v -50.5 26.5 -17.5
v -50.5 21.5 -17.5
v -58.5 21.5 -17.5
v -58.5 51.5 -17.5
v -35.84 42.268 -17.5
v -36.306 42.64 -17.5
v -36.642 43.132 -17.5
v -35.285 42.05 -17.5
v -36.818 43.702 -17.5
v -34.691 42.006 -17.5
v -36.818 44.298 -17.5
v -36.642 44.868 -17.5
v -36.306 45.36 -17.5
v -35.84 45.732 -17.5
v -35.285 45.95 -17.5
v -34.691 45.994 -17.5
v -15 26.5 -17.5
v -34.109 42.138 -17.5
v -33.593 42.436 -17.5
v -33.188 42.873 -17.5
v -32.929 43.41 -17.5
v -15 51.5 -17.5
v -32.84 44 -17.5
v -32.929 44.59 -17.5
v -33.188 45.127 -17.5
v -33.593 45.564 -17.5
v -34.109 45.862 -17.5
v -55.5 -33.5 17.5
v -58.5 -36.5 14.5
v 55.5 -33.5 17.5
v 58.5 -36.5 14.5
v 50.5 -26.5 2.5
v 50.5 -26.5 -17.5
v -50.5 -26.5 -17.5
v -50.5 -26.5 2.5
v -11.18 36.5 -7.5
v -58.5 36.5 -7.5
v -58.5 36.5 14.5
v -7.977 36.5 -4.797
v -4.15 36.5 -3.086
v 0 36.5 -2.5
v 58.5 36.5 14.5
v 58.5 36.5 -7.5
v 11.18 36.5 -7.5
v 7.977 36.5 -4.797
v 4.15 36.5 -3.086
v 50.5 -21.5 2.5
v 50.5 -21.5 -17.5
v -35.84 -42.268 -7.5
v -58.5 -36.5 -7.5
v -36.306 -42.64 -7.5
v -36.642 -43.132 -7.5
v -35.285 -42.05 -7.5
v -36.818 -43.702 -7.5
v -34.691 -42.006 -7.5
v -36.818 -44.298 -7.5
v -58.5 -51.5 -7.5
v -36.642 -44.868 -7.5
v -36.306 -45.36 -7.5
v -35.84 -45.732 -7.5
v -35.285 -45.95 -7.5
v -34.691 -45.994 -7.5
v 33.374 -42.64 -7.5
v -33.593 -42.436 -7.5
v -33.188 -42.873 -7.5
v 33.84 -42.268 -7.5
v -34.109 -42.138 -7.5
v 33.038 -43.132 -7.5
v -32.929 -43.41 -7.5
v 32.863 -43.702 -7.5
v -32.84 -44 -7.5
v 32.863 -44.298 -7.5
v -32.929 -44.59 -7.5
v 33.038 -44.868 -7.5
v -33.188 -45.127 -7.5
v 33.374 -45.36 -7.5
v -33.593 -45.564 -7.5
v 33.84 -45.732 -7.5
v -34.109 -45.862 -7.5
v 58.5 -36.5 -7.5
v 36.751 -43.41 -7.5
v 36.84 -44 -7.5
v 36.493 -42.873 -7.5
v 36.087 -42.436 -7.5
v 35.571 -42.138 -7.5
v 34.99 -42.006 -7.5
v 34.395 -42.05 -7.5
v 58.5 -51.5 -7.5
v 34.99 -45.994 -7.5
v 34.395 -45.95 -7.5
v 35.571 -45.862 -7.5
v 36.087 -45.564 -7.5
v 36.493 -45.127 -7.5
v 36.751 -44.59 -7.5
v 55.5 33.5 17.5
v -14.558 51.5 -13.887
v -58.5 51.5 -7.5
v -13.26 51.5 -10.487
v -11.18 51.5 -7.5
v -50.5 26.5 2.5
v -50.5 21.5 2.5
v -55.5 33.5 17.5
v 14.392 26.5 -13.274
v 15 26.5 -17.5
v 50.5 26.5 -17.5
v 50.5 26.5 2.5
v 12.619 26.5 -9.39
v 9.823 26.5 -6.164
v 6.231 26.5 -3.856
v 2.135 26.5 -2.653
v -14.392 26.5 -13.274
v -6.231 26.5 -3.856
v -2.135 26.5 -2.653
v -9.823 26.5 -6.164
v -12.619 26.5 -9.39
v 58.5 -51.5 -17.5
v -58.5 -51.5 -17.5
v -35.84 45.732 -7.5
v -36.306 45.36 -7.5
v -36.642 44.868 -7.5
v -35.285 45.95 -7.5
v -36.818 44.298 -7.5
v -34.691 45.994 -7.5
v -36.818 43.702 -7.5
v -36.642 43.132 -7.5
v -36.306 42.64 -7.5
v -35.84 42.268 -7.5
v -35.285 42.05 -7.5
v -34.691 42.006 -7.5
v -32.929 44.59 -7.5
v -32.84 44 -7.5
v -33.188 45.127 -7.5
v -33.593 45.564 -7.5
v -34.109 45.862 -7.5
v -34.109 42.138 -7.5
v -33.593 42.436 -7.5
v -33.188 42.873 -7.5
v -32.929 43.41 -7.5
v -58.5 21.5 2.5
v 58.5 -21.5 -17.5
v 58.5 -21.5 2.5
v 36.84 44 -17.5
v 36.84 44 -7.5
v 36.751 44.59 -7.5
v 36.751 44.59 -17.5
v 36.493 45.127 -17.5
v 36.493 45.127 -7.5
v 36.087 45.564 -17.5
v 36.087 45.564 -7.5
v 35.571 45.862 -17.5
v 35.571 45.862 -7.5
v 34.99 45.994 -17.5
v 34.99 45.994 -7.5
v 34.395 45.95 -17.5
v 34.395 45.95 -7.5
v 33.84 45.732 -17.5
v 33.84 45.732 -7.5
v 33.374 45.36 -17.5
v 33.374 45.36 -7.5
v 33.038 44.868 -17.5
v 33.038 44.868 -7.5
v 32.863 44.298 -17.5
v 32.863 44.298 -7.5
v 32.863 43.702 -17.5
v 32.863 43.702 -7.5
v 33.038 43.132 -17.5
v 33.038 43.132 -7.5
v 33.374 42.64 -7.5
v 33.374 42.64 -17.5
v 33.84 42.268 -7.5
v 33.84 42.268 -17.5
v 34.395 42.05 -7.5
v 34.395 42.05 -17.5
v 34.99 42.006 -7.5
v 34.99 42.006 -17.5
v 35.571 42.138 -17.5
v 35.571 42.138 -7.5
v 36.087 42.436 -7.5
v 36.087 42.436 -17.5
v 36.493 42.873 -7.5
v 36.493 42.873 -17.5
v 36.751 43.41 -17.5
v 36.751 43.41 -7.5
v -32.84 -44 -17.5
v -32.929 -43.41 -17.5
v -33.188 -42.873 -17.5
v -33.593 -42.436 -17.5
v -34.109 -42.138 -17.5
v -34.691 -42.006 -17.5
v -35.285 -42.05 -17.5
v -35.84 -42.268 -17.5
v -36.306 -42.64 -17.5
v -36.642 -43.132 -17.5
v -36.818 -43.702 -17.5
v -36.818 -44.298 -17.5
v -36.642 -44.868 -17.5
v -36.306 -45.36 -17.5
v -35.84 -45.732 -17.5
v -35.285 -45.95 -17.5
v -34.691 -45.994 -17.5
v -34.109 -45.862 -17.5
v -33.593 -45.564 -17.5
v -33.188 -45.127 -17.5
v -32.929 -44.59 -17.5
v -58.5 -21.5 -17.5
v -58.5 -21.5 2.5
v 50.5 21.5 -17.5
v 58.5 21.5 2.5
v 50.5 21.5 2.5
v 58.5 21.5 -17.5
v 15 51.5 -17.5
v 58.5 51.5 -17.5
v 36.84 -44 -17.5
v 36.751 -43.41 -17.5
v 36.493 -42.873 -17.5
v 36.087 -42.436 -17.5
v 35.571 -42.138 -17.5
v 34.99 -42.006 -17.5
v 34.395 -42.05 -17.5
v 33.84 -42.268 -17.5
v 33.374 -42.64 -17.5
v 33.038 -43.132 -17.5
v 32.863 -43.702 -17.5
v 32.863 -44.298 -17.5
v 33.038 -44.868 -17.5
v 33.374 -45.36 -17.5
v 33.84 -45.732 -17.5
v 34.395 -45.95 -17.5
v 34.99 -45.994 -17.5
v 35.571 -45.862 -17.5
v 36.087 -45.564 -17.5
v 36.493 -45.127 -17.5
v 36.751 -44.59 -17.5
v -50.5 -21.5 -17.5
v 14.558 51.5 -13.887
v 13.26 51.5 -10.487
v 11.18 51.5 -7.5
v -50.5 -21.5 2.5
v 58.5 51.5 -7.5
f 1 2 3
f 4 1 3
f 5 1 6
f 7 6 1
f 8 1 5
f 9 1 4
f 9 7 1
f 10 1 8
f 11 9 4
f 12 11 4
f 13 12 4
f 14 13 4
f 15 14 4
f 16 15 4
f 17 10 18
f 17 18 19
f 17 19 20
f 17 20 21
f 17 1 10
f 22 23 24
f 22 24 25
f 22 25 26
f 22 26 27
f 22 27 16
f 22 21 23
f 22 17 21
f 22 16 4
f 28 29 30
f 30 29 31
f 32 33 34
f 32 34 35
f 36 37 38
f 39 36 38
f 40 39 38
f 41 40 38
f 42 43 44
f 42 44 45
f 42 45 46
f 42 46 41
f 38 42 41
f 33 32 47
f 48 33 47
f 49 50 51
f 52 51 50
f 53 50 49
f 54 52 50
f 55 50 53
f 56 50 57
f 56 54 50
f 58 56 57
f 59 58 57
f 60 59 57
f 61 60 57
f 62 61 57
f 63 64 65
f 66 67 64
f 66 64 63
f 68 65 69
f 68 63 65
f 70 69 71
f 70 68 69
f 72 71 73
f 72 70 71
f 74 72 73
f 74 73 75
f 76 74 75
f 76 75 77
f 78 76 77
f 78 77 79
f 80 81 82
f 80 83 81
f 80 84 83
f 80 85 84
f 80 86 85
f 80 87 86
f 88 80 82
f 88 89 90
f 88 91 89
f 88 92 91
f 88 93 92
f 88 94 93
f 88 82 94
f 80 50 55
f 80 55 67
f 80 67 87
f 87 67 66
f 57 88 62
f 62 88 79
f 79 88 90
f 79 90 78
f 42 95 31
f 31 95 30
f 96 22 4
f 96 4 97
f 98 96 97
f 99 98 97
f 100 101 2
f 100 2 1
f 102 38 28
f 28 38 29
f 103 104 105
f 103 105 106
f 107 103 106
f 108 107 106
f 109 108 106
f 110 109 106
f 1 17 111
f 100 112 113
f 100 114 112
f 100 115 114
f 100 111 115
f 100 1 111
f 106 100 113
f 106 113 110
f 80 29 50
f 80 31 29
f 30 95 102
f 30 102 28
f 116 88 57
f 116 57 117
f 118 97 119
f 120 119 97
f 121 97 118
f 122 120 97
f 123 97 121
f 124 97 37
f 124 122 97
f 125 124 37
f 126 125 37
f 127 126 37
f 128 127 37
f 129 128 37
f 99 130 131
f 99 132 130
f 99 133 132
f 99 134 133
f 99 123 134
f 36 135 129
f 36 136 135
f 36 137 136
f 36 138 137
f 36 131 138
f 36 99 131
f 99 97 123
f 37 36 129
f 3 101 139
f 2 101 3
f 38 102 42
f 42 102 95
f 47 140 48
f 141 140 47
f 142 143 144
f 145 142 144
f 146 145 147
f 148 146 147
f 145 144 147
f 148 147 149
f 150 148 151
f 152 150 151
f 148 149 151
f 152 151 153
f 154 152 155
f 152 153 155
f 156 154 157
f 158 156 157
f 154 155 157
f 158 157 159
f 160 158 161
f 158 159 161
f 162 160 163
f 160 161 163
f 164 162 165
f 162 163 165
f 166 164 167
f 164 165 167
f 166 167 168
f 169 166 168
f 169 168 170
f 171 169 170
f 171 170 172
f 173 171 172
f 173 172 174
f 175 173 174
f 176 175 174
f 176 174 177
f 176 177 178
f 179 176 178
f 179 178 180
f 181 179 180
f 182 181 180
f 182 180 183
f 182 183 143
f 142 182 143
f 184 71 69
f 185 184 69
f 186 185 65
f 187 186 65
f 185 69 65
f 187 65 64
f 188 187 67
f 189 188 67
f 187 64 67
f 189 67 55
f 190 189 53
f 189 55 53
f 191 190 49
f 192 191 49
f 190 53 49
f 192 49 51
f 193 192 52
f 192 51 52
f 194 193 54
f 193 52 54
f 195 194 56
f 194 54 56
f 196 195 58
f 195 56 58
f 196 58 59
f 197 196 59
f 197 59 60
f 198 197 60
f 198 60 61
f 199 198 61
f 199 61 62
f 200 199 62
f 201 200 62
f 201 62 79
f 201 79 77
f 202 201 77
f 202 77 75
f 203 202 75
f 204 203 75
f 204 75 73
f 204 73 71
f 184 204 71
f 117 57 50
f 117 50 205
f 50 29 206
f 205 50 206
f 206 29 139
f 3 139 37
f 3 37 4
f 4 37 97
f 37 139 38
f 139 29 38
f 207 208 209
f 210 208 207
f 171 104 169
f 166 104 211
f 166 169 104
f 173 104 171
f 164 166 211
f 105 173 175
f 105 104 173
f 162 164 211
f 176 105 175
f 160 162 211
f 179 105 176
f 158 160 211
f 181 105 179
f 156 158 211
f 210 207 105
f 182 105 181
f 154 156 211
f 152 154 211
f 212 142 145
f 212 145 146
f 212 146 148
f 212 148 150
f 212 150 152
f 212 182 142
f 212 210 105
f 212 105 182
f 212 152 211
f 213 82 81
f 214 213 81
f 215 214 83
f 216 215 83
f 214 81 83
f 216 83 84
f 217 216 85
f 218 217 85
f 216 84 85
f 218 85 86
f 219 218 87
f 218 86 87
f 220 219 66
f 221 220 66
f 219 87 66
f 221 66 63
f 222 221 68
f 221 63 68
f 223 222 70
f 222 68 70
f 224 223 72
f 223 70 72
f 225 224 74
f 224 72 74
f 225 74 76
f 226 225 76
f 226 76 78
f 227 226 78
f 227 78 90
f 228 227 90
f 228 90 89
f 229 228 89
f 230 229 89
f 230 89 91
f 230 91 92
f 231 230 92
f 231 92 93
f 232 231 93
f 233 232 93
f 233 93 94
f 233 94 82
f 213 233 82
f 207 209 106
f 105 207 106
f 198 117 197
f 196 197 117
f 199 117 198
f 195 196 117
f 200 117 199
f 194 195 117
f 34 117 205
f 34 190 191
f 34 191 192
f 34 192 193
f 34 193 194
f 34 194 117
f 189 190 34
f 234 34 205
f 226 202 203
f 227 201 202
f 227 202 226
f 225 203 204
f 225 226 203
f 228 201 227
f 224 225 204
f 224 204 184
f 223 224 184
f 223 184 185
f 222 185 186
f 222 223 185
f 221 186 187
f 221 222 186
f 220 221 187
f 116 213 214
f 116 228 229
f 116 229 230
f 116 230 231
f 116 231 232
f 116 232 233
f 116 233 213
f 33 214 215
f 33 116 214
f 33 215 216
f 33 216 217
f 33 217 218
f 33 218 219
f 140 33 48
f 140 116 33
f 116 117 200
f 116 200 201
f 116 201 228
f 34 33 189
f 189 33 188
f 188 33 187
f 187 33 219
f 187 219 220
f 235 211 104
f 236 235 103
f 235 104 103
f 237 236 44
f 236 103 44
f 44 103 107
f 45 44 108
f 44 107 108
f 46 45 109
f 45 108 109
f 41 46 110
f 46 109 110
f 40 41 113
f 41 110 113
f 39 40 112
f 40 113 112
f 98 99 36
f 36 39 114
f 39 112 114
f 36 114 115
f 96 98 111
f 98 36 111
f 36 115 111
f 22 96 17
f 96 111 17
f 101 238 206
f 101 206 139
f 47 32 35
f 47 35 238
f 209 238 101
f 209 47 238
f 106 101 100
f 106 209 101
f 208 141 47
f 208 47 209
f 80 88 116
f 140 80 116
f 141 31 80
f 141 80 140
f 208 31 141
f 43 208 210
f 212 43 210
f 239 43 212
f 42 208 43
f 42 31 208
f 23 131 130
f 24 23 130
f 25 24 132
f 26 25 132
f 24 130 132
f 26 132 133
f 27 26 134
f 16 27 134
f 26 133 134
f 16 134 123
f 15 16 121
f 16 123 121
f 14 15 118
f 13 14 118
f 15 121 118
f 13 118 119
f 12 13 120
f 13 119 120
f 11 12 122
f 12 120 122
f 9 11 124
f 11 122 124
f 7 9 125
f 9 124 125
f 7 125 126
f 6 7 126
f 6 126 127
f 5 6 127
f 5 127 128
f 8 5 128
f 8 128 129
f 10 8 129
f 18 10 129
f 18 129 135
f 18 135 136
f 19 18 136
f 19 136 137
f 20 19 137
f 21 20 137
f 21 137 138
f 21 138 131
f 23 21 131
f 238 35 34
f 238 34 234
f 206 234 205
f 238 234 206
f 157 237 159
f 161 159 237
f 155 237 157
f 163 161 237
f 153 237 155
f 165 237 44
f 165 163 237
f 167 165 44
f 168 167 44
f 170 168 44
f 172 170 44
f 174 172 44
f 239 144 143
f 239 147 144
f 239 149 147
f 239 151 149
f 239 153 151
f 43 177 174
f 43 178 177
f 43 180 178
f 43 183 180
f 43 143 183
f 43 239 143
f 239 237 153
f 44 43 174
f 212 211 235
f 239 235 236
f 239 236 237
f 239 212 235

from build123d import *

# Parameters (mm, degrees)
F1_DEPTH = 58.5
F3_DEPTH = 148.4
F4_R     = 2
F5_DEPTH = 25
F6_W     = 5
F6_H     = 20
F7_DEPTH = 50.5
F8_SIZE  = 3


with BuildPart() as f1:
    # F0 (on Right) → F1 (new body, symmetric)
    with BuildSketch(Plane.YZ):
        Polygon((36.5, -7.5), (36.5, 17.5), (-36.5, 17.5), (-36.5, -7.5), (-51.5, -7.5), (-51.5, -17.5), (-36.5, -17.5), (-21.5, -17.5), (-21.5, 2.5), (21.5, 2.5), (21.5, -17.5), (36.5, -17.5), (51.5, -17.5), (51.5, -7.5), align=None)
    extrude(amount=F1_DEPTH, both=True)

    # F2 (on Front) → F3 (cut)
    with BuildSketch(Plane.XZ):
        with BuildLine():
            Line((-15, -17.5), (15, -17.5))
            ThreePointArc((15, -17.5), (0, -2.5), (-15, -17.5))
        make_face()
    extrude(amount=-F3_DEPTH, mode=Mode.SUBTRACT)

    # F4 (on Top) → F5 (cut)
    with BuildSketch(Plane.XY):
        with Locations((-34.84017, -44)):
            Circle(F4_R)
        with Locations((34.84017, -44)):
            Circle(F4_R)
        with Locations((-34.84017, 44)):
            Circle(F4_R)
        with Locations((34.84017, 44)):
            Circle(F4_R)
    extrude(amount=-F5_DEPTH, mode=Mode.SUBTRACT)

    # F6 (on Right) → F7 (cut, symmetric)
    with BuildSketch(Plane.YZ):
        with Locations((24, -7.5)):
            Rectangle(F6_W, F6_H)
        with Locations((-24, -7.5)):
            Rectangle(F6_W, F6_H)
    extrude(amount=F7_DEPTH, both=True, mode=Mode.SUBTRACT)

    # F8
    f8_edges = [f1.edges().sort_by_distance(p)[0] for p in [
        (0, 36.5, 17.5),
        (-58.5, 0, 17.5),
        (58.5, 0, 17.5),
        (0, -36.5, 17.5),
    ]]
    chamfer(f8_edges, length=F8_SIZE)


solid = f1.part
